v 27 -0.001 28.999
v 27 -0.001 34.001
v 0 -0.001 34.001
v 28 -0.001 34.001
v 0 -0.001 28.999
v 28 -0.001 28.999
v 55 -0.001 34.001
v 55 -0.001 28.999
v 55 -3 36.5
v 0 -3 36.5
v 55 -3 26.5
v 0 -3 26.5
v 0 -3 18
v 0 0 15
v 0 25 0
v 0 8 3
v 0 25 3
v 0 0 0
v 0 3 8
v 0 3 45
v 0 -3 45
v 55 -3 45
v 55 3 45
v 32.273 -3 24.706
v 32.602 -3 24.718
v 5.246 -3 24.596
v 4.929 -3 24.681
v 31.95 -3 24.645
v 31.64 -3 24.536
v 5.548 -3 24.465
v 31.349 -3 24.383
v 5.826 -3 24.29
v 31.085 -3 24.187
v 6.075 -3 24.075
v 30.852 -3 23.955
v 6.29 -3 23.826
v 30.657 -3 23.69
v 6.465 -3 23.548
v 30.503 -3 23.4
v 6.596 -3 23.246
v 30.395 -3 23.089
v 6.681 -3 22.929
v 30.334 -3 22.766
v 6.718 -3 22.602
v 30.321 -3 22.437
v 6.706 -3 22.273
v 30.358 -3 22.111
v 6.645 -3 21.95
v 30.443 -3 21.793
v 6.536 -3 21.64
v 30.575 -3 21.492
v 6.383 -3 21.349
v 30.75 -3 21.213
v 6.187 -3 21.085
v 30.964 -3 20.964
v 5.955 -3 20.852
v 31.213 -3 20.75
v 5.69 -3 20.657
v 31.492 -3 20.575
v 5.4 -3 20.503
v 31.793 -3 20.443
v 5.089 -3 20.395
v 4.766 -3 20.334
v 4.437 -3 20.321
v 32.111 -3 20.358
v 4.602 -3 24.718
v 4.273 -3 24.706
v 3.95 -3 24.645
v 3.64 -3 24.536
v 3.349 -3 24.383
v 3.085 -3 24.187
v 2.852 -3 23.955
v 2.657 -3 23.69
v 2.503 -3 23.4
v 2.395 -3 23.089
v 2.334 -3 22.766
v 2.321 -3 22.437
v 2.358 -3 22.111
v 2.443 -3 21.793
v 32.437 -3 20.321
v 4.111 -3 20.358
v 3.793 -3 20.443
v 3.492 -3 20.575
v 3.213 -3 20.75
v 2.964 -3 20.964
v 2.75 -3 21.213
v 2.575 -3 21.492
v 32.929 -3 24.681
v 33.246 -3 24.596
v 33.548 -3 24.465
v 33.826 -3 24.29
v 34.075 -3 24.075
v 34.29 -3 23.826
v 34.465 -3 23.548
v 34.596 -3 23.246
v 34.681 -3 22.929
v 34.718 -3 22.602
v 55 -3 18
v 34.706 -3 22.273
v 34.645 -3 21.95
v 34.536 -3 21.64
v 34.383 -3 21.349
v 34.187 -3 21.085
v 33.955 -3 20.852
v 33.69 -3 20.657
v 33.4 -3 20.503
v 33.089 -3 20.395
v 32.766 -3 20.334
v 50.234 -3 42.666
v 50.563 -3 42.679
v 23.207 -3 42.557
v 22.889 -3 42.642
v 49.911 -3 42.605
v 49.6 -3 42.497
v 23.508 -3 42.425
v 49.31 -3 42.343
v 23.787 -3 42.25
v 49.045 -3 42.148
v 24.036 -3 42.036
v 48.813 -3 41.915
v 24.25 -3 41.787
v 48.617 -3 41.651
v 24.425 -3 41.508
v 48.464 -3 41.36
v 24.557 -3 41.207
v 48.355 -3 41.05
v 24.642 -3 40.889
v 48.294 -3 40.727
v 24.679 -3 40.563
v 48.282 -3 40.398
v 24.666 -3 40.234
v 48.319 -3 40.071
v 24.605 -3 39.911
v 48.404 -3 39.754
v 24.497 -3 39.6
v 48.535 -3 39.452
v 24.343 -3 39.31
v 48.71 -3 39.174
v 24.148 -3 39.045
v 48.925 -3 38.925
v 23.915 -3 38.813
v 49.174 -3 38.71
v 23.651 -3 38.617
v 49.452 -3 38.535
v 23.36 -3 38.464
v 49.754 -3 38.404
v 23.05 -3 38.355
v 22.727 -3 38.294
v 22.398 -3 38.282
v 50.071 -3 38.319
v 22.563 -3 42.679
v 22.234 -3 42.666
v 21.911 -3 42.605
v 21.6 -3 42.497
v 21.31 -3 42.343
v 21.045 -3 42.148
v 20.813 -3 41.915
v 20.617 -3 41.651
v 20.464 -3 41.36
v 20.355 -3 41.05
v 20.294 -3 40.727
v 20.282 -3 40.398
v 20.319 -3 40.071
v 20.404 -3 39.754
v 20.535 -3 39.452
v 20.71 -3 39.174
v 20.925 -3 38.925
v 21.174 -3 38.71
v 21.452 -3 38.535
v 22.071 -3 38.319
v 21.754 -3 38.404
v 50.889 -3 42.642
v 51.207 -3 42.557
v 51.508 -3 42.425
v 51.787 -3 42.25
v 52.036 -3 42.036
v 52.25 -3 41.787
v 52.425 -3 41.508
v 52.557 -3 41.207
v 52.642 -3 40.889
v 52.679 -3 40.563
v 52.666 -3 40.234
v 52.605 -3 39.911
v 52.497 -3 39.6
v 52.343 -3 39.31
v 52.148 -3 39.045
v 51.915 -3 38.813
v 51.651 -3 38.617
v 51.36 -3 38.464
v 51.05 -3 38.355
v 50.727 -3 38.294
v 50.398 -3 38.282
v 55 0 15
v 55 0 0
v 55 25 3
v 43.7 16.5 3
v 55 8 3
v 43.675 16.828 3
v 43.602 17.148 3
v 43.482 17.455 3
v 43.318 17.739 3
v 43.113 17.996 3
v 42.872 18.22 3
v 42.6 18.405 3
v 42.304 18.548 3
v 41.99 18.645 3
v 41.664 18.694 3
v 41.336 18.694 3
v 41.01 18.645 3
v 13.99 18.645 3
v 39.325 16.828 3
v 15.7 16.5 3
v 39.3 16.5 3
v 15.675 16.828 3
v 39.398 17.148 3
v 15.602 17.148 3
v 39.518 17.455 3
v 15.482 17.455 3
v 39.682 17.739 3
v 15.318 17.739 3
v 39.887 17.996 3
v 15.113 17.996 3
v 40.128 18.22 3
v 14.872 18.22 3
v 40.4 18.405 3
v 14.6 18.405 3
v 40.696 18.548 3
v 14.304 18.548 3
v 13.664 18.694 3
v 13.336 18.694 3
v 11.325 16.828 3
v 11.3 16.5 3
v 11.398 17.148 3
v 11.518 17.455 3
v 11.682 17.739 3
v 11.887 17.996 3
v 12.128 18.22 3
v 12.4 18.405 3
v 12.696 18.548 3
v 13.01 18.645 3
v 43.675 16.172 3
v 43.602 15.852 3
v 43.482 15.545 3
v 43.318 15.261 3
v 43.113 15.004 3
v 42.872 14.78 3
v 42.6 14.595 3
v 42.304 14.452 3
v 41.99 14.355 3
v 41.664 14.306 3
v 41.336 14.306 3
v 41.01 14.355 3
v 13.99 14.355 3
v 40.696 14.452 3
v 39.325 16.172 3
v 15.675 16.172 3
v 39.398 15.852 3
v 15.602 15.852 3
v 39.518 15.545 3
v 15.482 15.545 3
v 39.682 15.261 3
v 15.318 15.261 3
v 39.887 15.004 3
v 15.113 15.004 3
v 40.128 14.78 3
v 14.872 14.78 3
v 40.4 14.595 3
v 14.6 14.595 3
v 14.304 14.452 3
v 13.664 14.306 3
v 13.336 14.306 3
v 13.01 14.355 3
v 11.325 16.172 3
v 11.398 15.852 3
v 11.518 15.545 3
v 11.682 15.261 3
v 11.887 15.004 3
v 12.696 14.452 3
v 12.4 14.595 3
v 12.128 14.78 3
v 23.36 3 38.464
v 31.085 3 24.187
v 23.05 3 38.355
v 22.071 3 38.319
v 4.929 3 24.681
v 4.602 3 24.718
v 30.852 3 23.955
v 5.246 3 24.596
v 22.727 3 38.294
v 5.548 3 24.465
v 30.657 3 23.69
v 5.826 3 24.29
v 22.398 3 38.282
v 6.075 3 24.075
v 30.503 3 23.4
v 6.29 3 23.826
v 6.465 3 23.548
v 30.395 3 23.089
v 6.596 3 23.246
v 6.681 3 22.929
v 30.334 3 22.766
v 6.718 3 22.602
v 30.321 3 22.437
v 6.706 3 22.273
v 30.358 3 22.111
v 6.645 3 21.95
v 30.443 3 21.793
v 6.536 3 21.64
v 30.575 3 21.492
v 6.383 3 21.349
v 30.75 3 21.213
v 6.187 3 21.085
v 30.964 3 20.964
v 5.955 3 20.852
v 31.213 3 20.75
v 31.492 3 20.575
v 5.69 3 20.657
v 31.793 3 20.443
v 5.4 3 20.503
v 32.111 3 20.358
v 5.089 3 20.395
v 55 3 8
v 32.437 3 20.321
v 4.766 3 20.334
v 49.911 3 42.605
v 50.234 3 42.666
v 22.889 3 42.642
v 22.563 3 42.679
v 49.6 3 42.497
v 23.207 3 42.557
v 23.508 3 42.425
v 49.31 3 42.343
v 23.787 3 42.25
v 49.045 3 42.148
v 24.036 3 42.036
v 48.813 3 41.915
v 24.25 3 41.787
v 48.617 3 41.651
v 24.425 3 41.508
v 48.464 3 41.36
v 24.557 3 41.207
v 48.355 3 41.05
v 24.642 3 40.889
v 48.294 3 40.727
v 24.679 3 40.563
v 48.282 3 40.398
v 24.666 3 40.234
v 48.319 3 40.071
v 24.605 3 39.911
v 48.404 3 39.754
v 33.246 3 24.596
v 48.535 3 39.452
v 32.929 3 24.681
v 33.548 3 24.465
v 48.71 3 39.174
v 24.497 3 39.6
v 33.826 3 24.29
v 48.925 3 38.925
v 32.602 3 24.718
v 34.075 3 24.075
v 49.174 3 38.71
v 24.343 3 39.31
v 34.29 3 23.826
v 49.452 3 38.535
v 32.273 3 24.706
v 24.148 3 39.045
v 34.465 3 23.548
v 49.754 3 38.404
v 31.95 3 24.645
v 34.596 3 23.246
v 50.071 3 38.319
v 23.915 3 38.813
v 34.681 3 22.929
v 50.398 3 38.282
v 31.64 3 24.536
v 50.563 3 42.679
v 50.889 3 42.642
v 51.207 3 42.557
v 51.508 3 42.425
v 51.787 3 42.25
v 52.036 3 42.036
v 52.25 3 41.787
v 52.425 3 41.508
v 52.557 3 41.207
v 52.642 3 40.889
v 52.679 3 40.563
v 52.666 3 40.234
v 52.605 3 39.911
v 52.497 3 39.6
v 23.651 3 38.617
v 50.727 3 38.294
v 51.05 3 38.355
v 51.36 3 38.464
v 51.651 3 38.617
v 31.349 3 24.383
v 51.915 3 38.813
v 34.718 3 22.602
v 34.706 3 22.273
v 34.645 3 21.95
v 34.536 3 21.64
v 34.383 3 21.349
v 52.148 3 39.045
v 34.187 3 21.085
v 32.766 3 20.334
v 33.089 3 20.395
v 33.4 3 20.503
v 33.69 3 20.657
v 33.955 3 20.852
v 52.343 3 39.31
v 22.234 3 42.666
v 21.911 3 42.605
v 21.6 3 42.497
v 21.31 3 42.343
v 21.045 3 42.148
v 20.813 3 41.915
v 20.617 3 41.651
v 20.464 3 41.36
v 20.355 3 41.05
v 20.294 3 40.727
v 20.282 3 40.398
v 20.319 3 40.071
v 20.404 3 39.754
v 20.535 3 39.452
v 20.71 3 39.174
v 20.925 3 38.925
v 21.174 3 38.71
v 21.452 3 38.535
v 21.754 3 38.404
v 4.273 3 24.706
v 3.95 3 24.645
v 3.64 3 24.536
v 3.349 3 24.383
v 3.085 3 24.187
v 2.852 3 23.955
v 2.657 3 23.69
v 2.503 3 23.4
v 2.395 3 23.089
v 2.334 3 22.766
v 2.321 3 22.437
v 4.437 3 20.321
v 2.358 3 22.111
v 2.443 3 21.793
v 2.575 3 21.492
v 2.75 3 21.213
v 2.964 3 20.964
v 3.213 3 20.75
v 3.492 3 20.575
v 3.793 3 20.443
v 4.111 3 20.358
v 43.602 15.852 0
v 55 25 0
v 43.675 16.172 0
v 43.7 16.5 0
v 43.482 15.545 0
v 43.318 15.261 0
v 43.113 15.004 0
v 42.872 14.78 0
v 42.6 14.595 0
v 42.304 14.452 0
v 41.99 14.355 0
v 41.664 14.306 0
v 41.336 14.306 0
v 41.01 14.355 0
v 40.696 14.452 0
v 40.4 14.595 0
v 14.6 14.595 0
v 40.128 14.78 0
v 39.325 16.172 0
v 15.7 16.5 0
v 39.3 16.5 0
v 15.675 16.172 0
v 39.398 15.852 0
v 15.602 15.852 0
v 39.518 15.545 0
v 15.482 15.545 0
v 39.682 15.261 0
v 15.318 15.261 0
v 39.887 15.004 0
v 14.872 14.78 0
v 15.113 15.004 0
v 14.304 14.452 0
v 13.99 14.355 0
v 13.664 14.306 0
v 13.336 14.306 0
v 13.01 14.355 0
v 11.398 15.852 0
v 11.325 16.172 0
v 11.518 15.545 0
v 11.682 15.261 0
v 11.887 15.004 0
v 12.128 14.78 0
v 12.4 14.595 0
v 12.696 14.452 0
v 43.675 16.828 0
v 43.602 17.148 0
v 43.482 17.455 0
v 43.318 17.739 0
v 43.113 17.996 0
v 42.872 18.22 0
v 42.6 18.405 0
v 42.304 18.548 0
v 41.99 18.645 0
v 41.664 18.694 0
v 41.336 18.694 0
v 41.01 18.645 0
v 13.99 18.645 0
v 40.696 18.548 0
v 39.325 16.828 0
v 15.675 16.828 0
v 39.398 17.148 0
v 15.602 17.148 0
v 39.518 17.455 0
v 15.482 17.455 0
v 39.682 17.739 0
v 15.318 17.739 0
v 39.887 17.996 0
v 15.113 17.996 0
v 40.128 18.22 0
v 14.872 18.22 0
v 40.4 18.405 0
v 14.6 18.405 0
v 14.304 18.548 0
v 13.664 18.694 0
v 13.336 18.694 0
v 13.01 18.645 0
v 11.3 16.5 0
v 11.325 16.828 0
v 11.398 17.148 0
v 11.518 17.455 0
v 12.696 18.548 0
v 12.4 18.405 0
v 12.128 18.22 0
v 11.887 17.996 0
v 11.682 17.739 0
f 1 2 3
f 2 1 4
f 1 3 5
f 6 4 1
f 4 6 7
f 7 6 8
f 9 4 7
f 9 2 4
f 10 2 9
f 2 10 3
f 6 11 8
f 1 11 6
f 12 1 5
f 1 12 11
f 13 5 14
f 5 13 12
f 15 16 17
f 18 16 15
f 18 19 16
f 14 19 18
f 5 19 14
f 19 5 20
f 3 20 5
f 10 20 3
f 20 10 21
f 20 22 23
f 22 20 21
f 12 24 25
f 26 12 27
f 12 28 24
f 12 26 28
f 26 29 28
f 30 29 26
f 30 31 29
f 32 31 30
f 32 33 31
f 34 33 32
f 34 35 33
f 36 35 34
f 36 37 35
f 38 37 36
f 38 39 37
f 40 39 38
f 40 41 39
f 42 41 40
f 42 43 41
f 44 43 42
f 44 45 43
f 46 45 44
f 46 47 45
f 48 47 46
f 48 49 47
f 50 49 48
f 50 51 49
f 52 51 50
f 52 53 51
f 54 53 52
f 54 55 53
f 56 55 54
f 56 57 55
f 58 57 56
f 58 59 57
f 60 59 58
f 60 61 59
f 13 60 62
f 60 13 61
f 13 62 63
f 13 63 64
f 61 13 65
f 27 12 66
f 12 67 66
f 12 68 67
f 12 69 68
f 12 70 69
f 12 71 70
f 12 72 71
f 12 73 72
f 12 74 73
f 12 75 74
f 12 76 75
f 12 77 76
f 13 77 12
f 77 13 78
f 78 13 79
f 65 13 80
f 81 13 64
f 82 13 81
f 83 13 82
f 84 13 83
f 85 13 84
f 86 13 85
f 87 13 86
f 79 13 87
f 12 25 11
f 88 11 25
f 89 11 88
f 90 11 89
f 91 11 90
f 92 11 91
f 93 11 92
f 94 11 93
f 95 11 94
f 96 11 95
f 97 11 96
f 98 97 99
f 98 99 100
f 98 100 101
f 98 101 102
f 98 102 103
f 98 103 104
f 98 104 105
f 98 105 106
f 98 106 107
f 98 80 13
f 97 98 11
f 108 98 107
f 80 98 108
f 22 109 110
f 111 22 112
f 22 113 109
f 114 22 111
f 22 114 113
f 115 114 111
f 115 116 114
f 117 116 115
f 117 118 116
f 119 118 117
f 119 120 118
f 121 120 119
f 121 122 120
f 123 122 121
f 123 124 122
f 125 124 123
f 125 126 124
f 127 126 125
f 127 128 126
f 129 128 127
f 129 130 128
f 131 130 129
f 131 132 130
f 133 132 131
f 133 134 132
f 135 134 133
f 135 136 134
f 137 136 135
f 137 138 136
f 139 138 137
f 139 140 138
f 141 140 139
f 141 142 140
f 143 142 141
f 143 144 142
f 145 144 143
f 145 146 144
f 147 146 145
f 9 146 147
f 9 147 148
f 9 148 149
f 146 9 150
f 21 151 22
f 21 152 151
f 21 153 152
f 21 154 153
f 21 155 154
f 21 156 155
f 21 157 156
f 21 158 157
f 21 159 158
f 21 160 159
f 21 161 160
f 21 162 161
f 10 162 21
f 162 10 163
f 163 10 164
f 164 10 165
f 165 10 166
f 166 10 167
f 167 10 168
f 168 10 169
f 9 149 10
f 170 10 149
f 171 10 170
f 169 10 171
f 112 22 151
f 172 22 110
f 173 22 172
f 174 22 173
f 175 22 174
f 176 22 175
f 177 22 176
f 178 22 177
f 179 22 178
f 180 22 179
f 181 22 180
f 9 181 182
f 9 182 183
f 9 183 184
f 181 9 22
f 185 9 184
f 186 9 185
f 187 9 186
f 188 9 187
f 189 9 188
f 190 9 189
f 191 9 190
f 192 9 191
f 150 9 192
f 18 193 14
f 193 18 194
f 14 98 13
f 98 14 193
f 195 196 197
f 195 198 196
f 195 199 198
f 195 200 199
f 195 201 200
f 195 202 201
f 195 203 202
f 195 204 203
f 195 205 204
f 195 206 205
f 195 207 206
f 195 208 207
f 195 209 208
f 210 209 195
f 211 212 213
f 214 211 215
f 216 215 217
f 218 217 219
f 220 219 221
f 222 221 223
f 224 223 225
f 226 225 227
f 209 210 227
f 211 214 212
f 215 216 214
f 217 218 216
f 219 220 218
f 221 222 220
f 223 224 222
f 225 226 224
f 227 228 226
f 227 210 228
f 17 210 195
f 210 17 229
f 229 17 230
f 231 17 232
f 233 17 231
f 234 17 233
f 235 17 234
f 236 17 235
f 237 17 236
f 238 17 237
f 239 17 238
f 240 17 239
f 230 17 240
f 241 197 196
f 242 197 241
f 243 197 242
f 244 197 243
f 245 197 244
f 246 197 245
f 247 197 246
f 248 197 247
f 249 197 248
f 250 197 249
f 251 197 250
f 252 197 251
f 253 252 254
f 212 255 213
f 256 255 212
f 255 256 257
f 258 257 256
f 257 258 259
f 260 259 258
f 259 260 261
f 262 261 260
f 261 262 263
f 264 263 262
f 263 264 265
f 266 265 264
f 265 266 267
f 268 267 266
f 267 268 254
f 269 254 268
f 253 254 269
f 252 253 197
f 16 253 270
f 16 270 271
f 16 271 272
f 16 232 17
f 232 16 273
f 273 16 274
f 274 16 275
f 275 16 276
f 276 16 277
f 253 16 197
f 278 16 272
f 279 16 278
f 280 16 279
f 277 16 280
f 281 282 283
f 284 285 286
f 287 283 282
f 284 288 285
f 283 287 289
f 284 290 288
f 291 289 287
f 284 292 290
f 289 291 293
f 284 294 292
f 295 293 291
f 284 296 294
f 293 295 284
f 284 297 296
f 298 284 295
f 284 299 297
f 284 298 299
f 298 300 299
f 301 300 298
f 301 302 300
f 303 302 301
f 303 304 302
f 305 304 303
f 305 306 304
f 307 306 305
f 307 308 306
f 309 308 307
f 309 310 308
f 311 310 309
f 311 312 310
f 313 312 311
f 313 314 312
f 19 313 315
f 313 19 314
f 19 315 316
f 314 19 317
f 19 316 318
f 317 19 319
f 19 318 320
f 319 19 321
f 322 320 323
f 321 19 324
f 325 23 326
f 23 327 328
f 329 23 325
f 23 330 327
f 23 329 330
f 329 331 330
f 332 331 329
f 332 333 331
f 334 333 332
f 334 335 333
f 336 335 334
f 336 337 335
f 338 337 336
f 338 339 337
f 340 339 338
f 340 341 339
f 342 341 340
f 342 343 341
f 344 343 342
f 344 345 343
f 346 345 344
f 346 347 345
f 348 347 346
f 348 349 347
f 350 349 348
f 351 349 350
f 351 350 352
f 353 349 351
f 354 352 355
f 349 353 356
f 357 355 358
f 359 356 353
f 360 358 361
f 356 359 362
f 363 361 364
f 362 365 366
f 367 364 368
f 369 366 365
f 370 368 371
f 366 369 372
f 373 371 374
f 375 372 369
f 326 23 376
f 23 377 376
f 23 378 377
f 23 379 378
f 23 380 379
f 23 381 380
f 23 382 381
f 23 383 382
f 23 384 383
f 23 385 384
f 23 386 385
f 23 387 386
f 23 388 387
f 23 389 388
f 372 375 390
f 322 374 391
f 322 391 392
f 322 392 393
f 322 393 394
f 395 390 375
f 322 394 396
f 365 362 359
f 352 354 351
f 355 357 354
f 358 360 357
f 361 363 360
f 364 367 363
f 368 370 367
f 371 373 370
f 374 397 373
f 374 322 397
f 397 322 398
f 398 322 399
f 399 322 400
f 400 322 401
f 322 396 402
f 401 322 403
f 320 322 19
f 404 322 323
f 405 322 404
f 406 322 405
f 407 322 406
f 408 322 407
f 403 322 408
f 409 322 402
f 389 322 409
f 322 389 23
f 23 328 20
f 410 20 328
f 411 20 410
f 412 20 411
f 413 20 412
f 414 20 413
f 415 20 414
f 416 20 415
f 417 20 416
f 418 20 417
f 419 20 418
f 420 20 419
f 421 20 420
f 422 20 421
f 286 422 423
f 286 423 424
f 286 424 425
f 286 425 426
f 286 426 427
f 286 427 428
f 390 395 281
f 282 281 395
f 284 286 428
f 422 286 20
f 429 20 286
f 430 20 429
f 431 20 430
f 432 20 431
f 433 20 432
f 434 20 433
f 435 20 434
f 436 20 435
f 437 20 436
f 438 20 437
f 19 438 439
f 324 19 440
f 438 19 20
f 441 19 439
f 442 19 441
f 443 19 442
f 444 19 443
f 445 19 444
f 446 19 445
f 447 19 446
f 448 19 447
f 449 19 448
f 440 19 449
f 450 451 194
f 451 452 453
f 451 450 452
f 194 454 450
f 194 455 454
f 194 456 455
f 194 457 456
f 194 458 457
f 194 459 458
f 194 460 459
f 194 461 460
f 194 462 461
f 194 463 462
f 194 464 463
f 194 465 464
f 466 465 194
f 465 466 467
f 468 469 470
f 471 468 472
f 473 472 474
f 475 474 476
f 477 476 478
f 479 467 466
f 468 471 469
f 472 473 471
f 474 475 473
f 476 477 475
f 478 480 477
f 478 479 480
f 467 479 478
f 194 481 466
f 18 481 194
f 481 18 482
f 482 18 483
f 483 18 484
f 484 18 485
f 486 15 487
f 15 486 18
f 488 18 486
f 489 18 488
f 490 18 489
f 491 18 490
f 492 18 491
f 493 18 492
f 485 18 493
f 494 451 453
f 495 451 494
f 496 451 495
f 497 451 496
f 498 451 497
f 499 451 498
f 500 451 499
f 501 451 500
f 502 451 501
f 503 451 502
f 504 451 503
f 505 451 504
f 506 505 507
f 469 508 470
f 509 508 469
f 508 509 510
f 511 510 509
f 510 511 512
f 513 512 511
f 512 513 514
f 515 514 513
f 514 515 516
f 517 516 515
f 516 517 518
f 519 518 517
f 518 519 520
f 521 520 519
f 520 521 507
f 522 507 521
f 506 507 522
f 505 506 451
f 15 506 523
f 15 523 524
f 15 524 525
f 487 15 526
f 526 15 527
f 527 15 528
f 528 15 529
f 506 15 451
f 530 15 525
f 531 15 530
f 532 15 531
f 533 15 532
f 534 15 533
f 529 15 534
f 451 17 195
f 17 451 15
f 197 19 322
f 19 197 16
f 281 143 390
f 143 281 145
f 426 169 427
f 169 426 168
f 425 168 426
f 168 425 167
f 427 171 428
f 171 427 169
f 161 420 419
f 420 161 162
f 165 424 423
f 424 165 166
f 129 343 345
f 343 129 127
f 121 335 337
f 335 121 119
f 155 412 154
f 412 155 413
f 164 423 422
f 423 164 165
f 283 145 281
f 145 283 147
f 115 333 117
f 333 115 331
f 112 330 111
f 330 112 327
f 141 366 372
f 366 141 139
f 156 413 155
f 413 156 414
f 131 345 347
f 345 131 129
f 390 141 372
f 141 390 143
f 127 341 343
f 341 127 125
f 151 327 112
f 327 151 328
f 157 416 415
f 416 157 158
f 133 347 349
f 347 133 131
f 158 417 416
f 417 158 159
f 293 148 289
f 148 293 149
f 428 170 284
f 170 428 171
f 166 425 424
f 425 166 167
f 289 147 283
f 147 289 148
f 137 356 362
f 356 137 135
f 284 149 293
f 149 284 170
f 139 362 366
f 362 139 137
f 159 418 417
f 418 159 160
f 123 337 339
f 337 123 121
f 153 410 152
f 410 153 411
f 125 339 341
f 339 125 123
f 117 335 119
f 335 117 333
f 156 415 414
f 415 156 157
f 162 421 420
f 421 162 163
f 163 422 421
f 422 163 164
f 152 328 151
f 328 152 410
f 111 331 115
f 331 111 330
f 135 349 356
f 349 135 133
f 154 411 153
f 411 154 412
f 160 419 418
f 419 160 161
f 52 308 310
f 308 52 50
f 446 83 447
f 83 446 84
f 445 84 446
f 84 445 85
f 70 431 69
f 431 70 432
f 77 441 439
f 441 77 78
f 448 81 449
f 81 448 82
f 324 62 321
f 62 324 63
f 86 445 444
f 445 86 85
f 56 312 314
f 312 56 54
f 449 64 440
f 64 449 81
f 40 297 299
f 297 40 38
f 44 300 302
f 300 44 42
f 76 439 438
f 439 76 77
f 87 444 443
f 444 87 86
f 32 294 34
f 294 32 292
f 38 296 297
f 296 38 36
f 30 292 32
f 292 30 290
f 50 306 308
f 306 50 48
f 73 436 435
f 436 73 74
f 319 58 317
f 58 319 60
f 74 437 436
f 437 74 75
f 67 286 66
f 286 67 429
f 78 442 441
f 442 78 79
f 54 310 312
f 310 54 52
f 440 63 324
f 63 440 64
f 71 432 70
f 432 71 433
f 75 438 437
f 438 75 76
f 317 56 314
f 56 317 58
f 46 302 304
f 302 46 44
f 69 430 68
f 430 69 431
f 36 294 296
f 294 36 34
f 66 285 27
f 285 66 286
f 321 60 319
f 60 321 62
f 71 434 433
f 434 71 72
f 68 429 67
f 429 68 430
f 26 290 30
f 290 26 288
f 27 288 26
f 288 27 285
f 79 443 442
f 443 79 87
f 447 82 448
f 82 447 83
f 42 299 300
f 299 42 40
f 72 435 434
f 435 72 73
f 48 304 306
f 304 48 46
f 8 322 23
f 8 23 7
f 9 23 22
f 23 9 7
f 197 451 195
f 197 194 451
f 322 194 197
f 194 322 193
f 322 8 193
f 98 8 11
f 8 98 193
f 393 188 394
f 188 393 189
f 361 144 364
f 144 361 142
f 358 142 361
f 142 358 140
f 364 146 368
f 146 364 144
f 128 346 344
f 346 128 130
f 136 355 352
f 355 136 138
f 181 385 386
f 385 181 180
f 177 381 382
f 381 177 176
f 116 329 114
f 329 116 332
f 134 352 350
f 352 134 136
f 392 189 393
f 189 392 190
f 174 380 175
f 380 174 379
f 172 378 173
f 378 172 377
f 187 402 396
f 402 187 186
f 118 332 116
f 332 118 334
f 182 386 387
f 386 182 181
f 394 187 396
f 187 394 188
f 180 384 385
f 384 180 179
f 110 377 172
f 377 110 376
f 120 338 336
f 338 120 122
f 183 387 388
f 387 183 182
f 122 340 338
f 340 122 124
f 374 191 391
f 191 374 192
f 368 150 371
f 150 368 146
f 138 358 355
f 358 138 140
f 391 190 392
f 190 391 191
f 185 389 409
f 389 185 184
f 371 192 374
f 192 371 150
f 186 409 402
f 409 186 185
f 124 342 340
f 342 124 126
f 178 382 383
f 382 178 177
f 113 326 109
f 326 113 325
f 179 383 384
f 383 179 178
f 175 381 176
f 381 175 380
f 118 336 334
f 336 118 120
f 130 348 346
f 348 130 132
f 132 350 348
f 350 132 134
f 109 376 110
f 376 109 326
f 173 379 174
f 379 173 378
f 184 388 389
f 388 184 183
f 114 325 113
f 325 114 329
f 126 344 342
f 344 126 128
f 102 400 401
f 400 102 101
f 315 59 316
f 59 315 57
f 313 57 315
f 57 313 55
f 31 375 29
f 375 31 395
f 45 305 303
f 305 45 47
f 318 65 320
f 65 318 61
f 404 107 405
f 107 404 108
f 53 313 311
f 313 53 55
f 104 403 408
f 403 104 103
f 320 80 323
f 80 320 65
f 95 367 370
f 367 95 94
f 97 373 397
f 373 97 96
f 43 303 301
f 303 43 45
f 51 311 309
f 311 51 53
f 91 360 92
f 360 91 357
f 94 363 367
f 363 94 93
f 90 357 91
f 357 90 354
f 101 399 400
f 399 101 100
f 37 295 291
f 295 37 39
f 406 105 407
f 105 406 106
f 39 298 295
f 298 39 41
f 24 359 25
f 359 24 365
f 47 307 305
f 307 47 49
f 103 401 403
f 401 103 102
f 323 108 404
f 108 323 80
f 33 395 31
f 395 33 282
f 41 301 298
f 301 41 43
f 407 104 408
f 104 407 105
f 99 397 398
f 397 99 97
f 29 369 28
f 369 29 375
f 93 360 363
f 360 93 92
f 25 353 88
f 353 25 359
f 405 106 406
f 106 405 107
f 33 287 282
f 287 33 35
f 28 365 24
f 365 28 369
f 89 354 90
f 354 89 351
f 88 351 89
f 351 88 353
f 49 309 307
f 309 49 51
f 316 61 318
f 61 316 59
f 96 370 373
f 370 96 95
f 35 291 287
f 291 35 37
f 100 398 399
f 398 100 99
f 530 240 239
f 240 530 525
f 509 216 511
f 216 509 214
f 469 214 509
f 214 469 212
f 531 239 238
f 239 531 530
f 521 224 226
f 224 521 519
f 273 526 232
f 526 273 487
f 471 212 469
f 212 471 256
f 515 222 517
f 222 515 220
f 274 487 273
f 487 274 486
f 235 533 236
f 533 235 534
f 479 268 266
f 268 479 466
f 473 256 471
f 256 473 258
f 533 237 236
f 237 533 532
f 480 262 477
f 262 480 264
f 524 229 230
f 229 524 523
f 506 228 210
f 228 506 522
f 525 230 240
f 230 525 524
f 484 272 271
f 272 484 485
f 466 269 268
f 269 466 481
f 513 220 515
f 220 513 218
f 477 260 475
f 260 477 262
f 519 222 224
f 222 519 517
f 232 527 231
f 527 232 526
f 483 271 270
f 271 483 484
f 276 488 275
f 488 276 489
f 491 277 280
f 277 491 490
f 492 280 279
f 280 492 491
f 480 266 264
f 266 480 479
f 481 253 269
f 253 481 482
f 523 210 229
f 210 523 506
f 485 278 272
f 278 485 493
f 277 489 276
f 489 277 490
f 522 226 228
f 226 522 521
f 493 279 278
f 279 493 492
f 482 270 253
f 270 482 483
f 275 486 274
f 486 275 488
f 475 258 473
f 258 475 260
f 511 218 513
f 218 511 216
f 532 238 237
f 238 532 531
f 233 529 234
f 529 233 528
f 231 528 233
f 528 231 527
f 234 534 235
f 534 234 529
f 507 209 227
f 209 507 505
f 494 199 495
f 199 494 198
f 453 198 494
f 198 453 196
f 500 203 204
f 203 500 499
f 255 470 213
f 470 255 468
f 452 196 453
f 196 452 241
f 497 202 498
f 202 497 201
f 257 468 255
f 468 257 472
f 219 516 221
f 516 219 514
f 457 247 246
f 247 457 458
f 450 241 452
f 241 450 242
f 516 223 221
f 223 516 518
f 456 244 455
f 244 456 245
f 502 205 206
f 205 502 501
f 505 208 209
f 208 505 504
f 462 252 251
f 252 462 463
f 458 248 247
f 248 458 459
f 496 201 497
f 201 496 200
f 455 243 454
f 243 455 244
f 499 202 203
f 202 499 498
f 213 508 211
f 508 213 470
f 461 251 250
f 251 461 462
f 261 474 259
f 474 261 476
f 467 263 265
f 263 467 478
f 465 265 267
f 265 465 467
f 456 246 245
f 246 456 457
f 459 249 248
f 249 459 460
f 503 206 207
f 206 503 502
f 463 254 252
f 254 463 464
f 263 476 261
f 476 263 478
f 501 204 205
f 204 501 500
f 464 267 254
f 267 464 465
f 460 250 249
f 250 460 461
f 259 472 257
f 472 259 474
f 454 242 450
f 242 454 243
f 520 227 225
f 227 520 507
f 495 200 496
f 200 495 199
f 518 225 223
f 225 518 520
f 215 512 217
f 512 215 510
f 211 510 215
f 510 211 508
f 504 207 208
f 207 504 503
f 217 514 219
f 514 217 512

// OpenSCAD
width = 20;
height = 20;
hole_dia = 4.4;
hole_off = 25.4 / 2;
hole_angle = 45;
ground_height = 10 + 5;
dist = 1;
wall = 3;
base_depth = 25;
support_l = 5;
add_width = 7;
add_height = 7;
add_support = 3;
section_gap_height = 10;
section_gap_part = 5;

valve_count = 2;

$fn = 42;

w = width + add_width;
h = height + ground_height + add_height;
l_all = valve_count * w + (valve_count - 1) * dist;

module prism(l, w, h) {
    polyhedron(
        points = [[0,0,0], [l,0,0], [l,w,0], [0,w,0], [0,w,h], [l,w,h]],
        faces = [[0,1,2,3],[5,4,3,2],[0,4,5,1],[0,3,4],[5,2,1]]
    );
}

module gap(l, w, h, p) {
    difference() {
        translate([-0.001, 0.001, 0])
        cube([l + 0.002, w + 0.001, h]);
        
        translate([-1, w, h])
        rotate([180, 0, 0])
        prism(l + 2, w, h / 2 - p / 2);
        
        translate([-1, 0, h / 2 - p / 2])
        rotate([-90, 0, 0])
        prism(l + 2, h / 2 - p / 2, w);
    }
}

module strengthening(l) {
    difference() {
        translate([0, wall, h - height - add_height + wall])
        cube([l, add_support, height + add_height]);
        
        translate([0, wall, wall + h - section_gap_height / 2 - (height + add_height) / 2])
        gap(l, add_support, section_gap_height, section_gap_part);
    }
    
    translate([0, wall + add_support, h - height - add_height + wall])
    rotate([180, 0, 0])
    prism(l, add_support, add_support);
}

module section(l) {
    translate([0, 0, wall])
    cube([l, wall, h]);
    
    cube([l, base_depth, wall]);
    
    translate([l, wall + support_l, wall])
    rotate([0, 0, 180])
    prism(l, support_l, support_l);
    
    translate([l, wall, 0])
    rotate([0, 0, 180])
    strengthening(l);
}

module holes() {
    rotate([0, hole_angle, 0]) {
        translate([-hole_off, -add_support, 0])
        rotate([-90, 0, 0])
        cylinder(d = hole_dia, h = wall + add_support + 2);
    
        translate([hole_off, -add_support, 0])
        rotate([-90, 0, 0])
        cylinder(d = hole_dia, h = wall + add_support + 2);
    }
}

module valve() {
    difference() {
        translate([0, 0, -wall])
        section(w);
        
        translate([w / 2, -1, ground_height + (add_height + height) / 2]) {
            //holes();
            
            scale([-1, 1, 1])
            holes();
        }
    }
}

module all_valves() {
    difference() {
        translate([0, 0, wall])
        for (i = [0 : valve_count - 1]) {
            if (i == 0) {
                translate([i * w, 0, 0])
                valve();
            } else {
                translate([i * w + (i - 1) * dist, 0, -wall])
                section(dist);
                
                translate([i * w + (i - 1) * dist + dist, 0, 0])
                valve();
            }
        }
        
        for (i = [0 : valve_count - 1]) {
            translate([i * w + (i - 1) * dist + dist + w / 2, wall + support_l + (base_depth - wall - support_l) / 2, -1])
            cylinder(d = hole_dia, h = wall + 2);
        }
    }
}

//rotate([0, -90, 0])
all_valves();
